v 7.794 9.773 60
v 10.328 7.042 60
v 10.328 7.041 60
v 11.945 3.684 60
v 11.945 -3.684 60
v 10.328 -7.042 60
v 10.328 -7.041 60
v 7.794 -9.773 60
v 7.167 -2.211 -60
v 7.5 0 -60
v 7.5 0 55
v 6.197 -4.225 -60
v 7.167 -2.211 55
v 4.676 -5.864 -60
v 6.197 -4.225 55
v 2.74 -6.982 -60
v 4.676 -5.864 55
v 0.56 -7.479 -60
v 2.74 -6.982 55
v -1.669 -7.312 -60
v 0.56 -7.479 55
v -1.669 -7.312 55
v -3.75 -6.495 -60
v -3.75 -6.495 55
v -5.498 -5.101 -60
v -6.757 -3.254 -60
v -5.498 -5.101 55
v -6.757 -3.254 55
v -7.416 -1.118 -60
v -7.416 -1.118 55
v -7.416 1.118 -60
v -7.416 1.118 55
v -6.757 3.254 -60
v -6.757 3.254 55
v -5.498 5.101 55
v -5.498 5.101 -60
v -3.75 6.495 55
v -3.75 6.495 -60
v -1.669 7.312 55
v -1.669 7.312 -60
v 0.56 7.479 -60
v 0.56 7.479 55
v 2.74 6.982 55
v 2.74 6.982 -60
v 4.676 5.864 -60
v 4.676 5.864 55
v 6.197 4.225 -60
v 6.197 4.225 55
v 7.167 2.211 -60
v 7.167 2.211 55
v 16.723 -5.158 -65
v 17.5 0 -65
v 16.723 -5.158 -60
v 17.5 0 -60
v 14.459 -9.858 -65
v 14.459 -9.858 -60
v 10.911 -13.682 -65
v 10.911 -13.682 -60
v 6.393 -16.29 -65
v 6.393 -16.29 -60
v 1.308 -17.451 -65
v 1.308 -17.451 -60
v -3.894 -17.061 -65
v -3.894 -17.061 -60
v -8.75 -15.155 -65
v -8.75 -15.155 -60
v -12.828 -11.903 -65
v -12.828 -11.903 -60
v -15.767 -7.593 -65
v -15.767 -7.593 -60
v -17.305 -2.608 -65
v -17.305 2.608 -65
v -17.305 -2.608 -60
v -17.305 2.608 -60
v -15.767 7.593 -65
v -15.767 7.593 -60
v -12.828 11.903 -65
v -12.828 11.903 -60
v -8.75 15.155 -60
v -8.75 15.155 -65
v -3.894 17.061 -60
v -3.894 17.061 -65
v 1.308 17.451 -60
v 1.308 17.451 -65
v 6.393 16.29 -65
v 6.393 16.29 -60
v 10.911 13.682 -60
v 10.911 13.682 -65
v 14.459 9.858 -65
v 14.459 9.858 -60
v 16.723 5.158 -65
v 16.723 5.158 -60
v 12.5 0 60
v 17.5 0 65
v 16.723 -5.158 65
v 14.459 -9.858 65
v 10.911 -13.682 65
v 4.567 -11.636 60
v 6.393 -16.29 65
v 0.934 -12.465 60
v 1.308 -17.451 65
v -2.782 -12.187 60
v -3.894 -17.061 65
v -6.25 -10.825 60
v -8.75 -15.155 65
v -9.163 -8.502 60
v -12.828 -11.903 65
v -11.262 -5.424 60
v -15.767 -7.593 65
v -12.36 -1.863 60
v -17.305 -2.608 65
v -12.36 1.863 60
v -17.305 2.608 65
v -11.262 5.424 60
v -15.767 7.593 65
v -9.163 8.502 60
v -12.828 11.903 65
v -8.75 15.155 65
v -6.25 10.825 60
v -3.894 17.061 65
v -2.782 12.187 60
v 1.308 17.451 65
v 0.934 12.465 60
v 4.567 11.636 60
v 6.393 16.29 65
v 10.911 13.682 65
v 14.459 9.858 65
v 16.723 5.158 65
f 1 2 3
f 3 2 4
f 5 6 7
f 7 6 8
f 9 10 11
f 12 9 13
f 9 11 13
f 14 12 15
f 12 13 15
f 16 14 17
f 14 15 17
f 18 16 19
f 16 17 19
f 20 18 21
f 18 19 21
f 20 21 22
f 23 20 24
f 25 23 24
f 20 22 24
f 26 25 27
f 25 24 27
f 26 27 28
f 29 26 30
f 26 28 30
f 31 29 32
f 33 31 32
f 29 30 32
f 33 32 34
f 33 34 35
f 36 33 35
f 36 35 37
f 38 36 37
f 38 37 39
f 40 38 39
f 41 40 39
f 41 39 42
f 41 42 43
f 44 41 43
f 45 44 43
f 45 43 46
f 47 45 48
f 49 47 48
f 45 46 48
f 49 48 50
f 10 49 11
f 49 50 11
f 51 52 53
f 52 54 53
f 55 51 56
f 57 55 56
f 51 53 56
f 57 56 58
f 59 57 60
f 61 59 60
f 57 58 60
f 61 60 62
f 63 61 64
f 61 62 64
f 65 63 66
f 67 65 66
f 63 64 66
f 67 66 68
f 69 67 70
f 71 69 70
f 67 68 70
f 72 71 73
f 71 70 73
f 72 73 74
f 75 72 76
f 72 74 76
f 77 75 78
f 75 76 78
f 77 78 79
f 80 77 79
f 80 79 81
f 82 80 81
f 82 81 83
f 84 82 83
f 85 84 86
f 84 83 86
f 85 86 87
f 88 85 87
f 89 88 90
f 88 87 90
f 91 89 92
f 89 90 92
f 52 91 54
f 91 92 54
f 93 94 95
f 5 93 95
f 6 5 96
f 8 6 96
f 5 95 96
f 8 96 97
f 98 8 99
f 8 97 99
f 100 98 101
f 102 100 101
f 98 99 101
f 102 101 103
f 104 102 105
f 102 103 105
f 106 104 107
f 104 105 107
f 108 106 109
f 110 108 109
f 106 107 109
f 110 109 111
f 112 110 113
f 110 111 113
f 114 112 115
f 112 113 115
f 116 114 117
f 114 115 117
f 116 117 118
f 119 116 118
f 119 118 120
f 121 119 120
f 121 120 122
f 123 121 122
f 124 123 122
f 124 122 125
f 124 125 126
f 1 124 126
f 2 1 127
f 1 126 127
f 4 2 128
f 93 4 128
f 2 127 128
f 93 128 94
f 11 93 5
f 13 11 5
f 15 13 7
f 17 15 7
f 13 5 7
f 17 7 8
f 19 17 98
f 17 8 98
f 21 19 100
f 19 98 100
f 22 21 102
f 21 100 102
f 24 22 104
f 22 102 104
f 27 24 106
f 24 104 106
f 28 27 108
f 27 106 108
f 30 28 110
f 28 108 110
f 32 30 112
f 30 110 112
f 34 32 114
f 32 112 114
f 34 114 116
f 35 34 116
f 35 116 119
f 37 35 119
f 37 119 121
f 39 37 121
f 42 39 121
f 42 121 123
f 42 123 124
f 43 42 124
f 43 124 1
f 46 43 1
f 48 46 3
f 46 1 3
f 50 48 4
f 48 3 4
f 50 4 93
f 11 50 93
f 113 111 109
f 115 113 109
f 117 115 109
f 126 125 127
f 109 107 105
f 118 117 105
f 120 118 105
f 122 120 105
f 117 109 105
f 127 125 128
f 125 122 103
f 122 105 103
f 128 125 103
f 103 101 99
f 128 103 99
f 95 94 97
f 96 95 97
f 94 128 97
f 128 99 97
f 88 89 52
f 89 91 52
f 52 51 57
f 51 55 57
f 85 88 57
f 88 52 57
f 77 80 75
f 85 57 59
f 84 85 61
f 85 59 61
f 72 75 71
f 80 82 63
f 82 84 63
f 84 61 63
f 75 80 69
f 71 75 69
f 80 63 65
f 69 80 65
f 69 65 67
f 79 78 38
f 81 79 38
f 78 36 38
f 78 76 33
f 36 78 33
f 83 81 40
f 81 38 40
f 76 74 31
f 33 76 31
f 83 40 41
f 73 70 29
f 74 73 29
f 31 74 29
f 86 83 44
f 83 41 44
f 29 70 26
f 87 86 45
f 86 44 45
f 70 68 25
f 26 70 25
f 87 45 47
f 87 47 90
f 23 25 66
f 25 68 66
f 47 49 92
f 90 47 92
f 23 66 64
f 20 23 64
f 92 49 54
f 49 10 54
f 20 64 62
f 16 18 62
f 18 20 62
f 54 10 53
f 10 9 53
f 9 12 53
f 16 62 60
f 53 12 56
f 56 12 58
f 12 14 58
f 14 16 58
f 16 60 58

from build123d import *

# Parameters (mm, degrees)
F0_W    = 7.5
F0_H    = 120
F4_SIZE = 4.99999


# Not quite as in the source:
# - a fillet or chamfer is up to 0.001 mm smaller than in the source, because OpenCascade refuses the exact size


with BuildPart() as f1:
    # F0 (on Front) → F1 (revolve)
    with BuildSketch(Plane.XZ):
        Polygon((0, 65), (0, 60), (7.5, 60), (17.5, 60), (17.5, 65), align=None)
    revolve(axis=Axis((0, 0, 0), (0, 0, -1)))

    # F0 (on Front) → F2 (revolve)
    with BuildSketch(Plane.XZ):
        with Locations((3.75, 0)):
            Rectangle(F0_W, F0_H)
    revolve(axis=Axis((0, 0, 0), (0, 0, -1)))

    # F0 (on Front) → F3 (revolve)
    with BuildSketch(Plane.XZ):
        Polygon((7.5, -60), (0, -60), (0, -65), (17.5, -65), (17.5, -60), align=None)
    revolve(axis=Axis((0, 0, 0), (0, 0, -1)))

    # F4 (size 5 in the source; OpenCascade refuses exactly that, so slightly less here)
    f4_edges = [f1.edges().sort_by_distance(p)[0] for p in [
        (-17.5, 0, 60),
        (-7.5, 0, 60),
    ]]
    chamfer(f4_edges, length=F4_SIZE)


solid = f1.part
